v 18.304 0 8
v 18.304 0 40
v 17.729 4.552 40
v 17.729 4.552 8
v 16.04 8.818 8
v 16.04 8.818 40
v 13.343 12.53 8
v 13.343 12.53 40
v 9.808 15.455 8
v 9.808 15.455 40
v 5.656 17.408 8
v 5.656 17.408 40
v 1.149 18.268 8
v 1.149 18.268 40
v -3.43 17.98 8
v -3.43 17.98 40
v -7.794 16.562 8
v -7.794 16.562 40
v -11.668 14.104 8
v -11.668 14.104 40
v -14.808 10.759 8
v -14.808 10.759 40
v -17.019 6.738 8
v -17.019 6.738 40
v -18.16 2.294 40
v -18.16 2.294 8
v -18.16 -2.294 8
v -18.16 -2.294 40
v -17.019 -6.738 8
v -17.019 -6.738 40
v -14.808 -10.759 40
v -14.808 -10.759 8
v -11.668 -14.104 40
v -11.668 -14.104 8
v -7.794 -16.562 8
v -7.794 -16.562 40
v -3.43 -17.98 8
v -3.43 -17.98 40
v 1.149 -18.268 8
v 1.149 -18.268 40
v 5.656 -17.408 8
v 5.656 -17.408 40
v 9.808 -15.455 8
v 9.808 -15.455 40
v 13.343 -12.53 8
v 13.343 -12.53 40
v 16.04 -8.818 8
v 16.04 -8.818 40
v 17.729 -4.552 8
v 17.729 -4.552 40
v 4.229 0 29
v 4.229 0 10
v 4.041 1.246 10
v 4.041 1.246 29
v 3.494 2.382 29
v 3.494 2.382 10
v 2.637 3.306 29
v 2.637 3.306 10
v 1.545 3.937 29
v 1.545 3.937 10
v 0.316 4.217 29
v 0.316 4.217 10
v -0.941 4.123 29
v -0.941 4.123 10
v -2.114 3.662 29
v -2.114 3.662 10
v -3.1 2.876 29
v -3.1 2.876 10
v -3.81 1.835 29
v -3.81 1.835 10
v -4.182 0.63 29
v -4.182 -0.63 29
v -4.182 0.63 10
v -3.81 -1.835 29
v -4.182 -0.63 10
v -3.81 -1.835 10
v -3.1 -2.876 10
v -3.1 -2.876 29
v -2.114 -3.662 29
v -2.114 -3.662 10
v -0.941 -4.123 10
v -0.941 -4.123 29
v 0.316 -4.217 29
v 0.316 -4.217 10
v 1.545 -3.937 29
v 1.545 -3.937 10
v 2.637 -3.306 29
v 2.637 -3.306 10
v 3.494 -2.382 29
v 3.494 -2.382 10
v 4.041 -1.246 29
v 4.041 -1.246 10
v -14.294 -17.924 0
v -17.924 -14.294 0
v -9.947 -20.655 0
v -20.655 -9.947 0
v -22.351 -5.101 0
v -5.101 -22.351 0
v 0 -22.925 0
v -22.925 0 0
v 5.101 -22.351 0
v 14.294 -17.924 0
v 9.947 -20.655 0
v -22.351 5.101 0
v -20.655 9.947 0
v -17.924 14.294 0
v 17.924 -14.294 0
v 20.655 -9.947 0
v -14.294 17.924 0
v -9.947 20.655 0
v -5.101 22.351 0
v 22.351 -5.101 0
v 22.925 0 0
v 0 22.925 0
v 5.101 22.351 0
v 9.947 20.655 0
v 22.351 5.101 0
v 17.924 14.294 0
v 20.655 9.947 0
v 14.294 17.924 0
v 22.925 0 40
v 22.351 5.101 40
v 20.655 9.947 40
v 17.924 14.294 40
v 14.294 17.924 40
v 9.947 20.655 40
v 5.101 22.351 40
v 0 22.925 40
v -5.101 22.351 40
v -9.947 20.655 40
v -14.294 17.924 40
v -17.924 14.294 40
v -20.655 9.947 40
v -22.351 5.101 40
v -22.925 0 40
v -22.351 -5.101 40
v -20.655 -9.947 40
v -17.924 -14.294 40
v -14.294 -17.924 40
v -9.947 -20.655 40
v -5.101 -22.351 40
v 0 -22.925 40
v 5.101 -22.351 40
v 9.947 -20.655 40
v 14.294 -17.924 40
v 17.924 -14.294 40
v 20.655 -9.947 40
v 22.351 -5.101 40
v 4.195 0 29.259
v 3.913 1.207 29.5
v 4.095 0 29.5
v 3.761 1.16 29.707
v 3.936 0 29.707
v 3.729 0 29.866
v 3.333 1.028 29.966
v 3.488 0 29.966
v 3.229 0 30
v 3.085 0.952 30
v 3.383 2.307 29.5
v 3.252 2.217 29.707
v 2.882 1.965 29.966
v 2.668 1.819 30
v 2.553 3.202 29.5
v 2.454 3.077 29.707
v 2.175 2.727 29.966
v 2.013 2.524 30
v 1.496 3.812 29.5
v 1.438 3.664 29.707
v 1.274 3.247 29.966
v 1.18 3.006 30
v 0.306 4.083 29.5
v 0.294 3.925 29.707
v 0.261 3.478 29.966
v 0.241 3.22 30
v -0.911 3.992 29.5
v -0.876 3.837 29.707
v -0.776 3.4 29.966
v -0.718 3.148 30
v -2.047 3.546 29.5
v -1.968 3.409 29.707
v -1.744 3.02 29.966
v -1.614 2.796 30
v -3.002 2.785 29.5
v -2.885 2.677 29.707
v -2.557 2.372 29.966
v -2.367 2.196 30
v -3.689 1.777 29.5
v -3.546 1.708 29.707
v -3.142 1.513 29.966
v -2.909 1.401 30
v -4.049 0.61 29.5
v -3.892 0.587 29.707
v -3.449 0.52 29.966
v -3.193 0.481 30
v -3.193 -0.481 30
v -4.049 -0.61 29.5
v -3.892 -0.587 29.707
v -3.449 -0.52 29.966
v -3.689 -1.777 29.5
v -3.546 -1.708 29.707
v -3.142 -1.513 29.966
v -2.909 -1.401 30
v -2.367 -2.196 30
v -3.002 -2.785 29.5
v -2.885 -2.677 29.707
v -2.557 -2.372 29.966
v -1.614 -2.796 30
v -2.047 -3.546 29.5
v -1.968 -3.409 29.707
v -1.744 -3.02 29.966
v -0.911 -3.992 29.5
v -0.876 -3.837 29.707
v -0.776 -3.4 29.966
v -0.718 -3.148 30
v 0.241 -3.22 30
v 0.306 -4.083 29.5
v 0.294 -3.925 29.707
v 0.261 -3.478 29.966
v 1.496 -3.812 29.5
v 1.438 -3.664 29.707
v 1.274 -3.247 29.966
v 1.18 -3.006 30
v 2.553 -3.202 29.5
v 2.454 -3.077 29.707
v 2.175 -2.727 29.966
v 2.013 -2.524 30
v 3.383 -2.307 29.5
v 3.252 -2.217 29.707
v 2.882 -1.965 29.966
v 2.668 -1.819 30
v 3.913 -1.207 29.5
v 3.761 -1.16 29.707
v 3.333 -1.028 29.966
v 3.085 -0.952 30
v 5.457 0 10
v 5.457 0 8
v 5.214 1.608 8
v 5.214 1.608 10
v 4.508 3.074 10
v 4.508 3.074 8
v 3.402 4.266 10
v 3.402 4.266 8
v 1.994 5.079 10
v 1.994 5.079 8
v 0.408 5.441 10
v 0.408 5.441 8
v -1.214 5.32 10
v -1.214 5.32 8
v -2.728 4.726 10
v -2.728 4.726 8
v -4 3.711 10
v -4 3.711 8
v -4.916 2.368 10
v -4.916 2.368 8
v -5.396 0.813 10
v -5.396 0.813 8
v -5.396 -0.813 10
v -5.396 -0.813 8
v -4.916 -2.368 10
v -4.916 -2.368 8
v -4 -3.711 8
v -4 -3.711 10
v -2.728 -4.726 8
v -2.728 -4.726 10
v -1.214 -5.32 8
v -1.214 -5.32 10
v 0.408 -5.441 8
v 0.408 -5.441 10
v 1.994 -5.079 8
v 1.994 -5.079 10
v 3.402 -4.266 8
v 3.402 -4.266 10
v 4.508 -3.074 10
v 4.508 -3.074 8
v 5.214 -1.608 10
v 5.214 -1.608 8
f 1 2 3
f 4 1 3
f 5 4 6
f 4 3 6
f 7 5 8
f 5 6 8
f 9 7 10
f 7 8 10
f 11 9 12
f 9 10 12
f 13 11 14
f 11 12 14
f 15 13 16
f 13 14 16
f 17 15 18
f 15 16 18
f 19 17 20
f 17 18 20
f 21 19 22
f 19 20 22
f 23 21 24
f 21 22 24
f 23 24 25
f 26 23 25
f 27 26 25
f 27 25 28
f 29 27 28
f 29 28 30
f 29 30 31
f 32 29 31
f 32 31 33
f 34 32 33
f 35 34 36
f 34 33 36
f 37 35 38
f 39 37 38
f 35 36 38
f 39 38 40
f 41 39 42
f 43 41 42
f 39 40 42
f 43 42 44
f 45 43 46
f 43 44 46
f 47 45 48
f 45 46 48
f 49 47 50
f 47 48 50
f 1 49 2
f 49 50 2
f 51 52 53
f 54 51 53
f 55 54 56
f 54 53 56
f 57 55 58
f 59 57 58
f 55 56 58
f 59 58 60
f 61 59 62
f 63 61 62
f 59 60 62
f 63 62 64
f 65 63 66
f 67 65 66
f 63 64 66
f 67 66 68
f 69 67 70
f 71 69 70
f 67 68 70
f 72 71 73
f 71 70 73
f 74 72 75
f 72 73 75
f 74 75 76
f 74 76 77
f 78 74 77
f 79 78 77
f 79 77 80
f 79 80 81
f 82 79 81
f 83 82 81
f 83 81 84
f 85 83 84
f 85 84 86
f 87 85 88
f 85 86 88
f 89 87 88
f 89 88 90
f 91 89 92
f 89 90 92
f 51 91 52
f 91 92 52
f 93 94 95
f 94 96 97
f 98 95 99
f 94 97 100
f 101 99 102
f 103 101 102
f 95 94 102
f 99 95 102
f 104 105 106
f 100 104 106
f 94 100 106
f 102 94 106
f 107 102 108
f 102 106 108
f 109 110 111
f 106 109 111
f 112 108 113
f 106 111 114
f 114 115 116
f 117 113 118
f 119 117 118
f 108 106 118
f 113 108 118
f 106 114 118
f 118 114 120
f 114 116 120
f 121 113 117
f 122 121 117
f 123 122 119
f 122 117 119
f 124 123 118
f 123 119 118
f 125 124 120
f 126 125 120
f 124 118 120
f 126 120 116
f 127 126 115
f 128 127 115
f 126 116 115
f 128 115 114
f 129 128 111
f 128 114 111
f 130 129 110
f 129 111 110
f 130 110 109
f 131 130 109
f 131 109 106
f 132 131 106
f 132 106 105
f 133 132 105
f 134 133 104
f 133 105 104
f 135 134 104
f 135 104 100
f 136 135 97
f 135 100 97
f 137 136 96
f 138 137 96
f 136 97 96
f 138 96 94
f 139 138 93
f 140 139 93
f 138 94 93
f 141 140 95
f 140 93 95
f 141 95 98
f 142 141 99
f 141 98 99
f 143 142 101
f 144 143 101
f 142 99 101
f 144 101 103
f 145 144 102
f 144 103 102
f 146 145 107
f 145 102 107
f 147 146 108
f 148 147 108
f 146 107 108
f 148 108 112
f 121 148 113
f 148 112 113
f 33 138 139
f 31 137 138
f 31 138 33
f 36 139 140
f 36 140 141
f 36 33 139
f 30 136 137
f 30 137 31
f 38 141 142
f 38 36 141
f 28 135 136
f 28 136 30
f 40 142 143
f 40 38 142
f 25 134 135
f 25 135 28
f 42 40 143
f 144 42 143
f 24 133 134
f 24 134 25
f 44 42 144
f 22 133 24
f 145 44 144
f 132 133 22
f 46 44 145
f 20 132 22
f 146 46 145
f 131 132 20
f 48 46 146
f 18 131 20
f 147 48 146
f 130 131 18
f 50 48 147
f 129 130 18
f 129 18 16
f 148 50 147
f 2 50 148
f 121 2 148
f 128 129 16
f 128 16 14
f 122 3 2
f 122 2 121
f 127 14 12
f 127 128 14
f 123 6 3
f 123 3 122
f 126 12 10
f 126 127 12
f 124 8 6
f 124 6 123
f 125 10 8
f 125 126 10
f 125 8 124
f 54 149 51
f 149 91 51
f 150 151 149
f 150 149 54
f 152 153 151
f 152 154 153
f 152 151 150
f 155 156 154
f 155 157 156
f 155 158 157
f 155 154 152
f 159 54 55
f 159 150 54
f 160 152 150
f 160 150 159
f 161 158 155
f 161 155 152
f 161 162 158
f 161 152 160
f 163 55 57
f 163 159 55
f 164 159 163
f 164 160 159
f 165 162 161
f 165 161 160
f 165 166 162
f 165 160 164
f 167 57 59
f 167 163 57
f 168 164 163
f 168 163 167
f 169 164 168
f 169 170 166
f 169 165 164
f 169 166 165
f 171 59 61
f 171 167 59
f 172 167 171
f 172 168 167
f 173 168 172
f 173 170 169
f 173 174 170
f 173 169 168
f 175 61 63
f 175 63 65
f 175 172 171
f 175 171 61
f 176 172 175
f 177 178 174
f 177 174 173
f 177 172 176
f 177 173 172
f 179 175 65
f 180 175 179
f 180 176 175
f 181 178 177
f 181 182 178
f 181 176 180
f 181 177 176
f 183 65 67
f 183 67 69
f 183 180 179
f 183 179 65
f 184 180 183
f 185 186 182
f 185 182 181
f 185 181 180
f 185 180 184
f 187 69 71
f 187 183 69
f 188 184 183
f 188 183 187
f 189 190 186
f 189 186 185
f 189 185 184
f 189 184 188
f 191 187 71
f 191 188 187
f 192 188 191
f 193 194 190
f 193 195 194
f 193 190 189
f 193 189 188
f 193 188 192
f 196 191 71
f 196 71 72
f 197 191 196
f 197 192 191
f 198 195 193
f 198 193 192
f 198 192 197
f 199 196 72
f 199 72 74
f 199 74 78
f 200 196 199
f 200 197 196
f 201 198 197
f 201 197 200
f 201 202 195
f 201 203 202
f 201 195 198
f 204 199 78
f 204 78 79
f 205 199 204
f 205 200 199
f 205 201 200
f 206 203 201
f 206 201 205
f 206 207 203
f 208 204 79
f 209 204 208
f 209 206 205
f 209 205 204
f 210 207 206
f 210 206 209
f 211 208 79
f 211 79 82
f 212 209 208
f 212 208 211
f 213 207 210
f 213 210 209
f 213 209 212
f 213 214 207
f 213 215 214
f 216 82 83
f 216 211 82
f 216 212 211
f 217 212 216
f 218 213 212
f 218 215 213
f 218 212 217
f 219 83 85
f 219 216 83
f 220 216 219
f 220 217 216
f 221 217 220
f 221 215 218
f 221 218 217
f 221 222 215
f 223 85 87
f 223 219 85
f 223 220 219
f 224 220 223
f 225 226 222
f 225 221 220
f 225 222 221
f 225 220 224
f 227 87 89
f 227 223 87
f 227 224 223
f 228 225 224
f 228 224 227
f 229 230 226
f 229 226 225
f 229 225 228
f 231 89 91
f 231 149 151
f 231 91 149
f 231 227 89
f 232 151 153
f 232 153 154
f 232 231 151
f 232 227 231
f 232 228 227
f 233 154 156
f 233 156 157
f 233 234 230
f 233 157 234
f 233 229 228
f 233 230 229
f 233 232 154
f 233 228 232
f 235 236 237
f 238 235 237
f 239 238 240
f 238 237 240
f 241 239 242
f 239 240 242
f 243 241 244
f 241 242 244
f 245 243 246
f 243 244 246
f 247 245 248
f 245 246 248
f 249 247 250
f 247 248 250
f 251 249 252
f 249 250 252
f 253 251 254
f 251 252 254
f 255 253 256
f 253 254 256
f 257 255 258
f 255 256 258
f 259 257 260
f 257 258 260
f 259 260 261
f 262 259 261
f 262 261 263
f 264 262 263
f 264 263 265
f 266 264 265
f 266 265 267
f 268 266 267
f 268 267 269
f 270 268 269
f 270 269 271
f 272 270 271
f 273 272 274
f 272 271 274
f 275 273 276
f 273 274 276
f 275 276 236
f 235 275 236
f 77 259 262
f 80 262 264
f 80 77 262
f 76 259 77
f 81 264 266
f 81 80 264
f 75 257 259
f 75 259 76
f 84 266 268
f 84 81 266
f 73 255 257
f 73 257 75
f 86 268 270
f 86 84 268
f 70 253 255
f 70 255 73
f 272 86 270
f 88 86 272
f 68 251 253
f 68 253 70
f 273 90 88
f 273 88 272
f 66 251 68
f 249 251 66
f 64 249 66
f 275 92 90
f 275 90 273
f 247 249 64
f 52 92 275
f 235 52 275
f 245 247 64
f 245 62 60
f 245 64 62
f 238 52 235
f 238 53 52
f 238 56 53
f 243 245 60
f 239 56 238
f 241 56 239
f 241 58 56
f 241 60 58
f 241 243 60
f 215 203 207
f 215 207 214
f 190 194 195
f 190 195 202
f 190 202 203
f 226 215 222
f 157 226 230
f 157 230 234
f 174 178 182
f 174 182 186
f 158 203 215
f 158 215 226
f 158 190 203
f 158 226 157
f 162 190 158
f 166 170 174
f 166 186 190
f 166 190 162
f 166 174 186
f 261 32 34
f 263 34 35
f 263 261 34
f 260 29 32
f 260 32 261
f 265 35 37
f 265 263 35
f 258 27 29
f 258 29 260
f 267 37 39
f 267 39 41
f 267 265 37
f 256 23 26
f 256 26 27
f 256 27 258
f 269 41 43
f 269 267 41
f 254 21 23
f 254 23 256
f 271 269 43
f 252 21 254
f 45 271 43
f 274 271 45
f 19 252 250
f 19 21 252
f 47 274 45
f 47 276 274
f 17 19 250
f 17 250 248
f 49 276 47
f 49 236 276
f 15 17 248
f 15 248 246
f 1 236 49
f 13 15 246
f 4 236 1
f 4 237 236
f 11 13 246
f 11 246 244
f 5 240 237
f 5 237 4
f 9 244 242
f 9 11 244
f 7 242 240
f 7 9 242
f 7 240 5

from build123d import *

# Parameters (mm, degrees)
SKETCH_R     = 22.925405
PAD_DEPTH    = 40
SKETCH001_R  = 18.304244
POCKET_DEPTH = 32
SKETCH002_R  = 5.45658
PAD001_DEPTH = 2
SKETCH003_R  = 4.228884
PAD002_DEPTH = 20
FILLET_R     = 1


with BuildPart() as part:
    # Sketch → Pad (new body)
    with BuildSketch(Plane.XY):
        Circle(SKETCH_R)
    extrude(amount=PAD_DEPTH)

    # Sketch001 (on Face3 of Pad) → Pocket (cut)
    with BuildSketch(Plane.XY.offset(40)):
        Circle(SKETCH001_R)
    extrude(amount=-POCKET_DEPTH, mode=Mode.SUBTRACT)

    # Sketch002 (on Face5 of Pocket) → Pad001 (join)
    with BuildSketch(Plane.XY.offset(8)):
        Circle(SKETCH002_R)
    extrude(amount=PAD001_DEPTH)

    # Sketch003 (on Face7 of Pad001) → Pad002 (join)
    with BuildSketch(Plane.XY.offset(10)):
        Circle(SKETCH003_R)
    extrude(amount=PAD002_DEPTH)

    # Fillet
    fillet_edges = [part.edges().sort_by_distance(p)[0] for p in [
        (-4.228884, 0, 30),
    ]]
    fillet(fillet_edges, radius=FILLET_R)


solid = part.part
